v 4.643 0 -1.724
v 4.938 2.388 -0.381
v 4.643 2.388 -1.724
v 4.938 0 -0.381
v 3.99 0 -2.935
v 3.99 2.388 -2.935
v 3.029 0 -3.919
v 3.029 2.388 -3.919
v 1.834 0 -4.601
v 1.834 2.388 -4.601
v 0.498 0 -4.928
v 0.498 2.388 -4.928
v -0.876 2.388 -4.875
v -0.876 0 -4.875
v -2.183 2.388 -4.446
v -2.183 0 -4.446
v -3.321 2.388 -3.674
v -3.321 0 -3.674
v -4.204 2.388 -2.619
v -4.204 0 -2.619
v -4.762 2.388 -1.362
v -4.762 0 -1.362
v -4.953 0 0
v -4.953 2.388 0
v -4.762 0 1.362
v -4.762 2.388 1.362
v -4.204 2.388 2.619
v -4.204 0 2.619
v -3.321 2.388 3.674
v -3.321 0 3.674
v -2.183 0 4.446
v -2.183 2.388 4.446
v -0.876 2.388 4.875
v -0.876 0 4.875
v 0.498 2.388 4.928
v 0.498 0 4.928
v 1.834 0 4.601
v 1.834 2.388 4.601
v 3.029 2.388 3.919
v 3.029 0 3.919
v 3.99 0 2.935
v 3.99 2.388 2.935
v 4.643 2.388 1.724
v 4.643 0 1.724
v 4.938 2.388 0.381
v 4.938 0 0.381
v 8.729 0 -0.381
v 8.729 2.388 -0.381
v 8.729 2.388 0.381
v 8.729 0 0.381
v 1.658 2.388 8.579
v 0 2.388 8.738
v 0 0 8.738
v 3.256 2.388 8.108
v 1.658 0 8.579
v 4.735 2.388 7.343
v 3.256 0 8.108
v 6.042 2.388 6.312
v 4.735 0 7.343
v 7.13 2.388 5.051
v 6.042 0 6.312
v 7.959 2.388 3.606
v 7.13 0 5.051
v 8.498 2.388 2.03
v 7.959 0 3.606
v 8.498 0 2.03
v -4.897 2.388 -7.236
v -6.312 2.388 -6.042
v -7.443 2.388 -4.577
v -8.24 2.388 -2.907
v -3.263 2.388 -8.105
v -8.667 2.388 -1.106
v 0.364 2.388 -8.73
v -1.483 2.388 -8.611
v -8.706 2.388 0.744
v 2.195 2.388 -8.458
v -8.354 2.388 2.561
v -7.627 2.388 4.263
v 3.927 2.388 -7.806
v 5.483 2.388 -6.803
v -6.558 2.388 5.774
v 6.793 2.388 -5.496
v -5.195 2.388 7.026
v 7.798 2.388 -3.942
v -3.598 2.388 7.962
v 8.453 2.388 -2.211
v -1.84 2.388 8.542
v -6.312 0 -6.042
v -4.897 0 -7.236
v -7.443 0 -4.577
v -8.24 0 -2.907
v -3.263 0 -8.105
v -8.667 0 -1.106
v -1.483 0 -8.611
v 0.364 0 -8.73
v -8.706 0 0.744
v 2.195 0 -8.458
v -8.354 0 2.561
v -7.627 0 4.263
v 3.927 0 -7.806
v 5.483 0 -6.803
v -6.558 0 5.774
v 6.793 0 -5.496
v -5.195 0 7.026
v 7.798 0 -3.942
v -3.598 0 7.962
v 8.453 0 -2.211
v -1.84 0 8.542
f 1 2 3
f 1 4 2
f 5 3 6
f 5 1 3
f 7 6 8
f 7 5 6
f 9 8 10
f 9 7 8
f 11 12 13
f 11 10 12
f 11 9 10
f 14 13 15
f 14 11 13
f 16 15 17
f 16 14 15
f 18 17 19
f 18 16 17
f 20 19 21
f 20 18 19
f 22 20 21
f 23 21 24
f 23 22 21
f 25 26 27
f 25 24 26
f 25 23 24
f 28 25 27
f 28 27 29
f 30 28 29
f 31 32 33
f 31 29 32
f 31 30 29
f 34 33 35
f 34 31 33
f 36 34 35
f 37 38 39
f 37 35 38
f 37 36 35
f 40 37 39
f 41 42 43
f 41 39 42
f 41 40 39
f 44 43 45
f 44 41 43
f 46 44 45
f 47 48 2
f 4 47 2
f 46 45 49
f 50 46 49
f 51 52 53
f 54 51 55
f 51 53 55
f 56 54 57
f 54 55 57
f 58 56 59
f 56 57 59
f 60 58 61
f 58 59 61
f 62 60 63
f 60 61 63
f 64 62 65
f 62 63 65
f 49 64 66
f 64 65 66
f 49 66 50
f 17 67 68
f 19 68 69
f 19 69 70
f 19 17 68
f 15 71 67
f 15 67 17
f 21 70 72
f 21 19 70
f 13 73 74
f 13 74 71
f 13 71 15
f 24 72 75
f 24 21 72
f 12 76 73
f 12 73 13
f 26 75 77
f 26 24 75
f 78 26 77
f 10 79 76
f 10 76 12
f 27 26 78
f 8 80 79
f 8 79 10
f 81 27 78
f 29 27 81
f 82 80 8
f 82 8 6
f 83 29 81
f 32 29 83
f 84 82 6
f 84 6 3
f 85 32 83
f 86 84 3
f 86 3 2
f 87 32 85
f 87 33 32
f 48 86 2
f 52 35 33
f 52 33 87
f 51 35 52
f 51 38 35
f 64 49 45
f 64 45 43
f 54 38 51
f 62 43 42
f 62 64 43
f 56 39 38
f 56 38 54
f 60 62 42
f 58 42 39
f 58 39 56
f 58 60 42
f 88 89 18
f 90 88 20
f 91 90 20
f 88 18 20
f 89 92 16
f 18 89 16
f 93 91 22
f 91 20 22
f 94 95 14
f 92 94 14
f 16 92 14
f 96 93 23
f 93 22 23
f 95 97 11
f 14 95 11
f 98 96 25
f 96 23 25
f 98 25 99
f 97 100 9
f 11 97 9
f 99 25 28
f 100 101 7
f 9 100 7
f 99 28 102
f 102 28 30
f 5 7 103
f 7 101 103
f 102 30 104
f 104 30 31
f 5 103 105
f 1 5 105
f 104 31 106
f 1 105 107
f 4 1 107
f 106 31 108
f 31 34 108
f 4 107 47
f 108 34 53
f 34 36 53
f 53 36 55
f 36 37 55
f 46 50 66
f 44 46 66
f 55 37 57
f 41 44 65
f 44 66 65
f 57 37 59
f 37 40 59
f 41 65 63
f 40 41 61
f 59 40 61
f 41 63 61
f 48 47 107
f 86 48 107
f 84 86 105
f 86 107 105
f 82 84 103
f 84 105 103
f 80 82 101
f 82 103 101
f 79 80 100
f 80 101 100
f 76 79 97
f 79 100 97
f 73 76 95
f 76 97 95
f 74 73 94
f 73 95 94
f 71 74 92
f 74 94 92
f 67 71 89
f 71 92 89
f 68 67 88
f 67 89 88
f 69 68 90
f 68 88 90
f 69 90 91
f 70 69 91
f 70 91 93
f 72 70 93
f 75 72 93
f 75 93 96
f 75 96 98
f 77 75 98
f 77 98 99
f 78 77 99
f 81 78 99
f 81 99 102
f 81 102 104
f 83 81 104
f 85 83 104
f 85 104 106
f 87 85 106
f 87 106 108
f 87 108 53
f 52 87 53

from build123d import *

# Parameters (mm, degrees)
SKETCH1_R          = 8.7376
SKETCH1_R_2        = 4.953
BASE_EXTRUDE_DEPTH = 2.3876
CUT_EXTRUDE1_DEPTH = 13.58538602


with BuildPart() as part:
    # Sketch1 → Base-Extrude (new body)
    with BuildSketch(Plane(origin=(0, 0, 0), x_dir=(1, 0, 0), z_dir=(0, 1, 0))):
        with Locations(Location((0, 0, 0), (0, 0, 270))):
            Circle(SKETCH1_R)
        with Locations(Location((0, 0, 0), (0, 0, 270))):
            Circle(SKETCH1_R_2, mode=Mode.SUBTRACT)
    extrude(amount=BASE_EXTRUDE_DEPTH)

    # Sketch2 → Cut-Extrude1 (cut, through all)
    with BuildSketch(Plane(origin=(0, 2.3876, 0), x_dir=(-1, 0, 0), z_dir=(0, 1, 0))):
        with BuildLine():
            Line((-8.729289362, -0.381), (0, -0.381))
            Line((0, -0.381), (0, 0.381))
            Line((0, 0.381), (-8.729289362, 0.381))
            ThreePointArc((-8.729289362, 0.381), (-8.7376, 0), (-8.729289362, -0.381))
        make_face()
    extrude(amount=-CUT_EXTRUDE1_DEPTH, mode=Mode.SUBTRACT)


solid = part.part
